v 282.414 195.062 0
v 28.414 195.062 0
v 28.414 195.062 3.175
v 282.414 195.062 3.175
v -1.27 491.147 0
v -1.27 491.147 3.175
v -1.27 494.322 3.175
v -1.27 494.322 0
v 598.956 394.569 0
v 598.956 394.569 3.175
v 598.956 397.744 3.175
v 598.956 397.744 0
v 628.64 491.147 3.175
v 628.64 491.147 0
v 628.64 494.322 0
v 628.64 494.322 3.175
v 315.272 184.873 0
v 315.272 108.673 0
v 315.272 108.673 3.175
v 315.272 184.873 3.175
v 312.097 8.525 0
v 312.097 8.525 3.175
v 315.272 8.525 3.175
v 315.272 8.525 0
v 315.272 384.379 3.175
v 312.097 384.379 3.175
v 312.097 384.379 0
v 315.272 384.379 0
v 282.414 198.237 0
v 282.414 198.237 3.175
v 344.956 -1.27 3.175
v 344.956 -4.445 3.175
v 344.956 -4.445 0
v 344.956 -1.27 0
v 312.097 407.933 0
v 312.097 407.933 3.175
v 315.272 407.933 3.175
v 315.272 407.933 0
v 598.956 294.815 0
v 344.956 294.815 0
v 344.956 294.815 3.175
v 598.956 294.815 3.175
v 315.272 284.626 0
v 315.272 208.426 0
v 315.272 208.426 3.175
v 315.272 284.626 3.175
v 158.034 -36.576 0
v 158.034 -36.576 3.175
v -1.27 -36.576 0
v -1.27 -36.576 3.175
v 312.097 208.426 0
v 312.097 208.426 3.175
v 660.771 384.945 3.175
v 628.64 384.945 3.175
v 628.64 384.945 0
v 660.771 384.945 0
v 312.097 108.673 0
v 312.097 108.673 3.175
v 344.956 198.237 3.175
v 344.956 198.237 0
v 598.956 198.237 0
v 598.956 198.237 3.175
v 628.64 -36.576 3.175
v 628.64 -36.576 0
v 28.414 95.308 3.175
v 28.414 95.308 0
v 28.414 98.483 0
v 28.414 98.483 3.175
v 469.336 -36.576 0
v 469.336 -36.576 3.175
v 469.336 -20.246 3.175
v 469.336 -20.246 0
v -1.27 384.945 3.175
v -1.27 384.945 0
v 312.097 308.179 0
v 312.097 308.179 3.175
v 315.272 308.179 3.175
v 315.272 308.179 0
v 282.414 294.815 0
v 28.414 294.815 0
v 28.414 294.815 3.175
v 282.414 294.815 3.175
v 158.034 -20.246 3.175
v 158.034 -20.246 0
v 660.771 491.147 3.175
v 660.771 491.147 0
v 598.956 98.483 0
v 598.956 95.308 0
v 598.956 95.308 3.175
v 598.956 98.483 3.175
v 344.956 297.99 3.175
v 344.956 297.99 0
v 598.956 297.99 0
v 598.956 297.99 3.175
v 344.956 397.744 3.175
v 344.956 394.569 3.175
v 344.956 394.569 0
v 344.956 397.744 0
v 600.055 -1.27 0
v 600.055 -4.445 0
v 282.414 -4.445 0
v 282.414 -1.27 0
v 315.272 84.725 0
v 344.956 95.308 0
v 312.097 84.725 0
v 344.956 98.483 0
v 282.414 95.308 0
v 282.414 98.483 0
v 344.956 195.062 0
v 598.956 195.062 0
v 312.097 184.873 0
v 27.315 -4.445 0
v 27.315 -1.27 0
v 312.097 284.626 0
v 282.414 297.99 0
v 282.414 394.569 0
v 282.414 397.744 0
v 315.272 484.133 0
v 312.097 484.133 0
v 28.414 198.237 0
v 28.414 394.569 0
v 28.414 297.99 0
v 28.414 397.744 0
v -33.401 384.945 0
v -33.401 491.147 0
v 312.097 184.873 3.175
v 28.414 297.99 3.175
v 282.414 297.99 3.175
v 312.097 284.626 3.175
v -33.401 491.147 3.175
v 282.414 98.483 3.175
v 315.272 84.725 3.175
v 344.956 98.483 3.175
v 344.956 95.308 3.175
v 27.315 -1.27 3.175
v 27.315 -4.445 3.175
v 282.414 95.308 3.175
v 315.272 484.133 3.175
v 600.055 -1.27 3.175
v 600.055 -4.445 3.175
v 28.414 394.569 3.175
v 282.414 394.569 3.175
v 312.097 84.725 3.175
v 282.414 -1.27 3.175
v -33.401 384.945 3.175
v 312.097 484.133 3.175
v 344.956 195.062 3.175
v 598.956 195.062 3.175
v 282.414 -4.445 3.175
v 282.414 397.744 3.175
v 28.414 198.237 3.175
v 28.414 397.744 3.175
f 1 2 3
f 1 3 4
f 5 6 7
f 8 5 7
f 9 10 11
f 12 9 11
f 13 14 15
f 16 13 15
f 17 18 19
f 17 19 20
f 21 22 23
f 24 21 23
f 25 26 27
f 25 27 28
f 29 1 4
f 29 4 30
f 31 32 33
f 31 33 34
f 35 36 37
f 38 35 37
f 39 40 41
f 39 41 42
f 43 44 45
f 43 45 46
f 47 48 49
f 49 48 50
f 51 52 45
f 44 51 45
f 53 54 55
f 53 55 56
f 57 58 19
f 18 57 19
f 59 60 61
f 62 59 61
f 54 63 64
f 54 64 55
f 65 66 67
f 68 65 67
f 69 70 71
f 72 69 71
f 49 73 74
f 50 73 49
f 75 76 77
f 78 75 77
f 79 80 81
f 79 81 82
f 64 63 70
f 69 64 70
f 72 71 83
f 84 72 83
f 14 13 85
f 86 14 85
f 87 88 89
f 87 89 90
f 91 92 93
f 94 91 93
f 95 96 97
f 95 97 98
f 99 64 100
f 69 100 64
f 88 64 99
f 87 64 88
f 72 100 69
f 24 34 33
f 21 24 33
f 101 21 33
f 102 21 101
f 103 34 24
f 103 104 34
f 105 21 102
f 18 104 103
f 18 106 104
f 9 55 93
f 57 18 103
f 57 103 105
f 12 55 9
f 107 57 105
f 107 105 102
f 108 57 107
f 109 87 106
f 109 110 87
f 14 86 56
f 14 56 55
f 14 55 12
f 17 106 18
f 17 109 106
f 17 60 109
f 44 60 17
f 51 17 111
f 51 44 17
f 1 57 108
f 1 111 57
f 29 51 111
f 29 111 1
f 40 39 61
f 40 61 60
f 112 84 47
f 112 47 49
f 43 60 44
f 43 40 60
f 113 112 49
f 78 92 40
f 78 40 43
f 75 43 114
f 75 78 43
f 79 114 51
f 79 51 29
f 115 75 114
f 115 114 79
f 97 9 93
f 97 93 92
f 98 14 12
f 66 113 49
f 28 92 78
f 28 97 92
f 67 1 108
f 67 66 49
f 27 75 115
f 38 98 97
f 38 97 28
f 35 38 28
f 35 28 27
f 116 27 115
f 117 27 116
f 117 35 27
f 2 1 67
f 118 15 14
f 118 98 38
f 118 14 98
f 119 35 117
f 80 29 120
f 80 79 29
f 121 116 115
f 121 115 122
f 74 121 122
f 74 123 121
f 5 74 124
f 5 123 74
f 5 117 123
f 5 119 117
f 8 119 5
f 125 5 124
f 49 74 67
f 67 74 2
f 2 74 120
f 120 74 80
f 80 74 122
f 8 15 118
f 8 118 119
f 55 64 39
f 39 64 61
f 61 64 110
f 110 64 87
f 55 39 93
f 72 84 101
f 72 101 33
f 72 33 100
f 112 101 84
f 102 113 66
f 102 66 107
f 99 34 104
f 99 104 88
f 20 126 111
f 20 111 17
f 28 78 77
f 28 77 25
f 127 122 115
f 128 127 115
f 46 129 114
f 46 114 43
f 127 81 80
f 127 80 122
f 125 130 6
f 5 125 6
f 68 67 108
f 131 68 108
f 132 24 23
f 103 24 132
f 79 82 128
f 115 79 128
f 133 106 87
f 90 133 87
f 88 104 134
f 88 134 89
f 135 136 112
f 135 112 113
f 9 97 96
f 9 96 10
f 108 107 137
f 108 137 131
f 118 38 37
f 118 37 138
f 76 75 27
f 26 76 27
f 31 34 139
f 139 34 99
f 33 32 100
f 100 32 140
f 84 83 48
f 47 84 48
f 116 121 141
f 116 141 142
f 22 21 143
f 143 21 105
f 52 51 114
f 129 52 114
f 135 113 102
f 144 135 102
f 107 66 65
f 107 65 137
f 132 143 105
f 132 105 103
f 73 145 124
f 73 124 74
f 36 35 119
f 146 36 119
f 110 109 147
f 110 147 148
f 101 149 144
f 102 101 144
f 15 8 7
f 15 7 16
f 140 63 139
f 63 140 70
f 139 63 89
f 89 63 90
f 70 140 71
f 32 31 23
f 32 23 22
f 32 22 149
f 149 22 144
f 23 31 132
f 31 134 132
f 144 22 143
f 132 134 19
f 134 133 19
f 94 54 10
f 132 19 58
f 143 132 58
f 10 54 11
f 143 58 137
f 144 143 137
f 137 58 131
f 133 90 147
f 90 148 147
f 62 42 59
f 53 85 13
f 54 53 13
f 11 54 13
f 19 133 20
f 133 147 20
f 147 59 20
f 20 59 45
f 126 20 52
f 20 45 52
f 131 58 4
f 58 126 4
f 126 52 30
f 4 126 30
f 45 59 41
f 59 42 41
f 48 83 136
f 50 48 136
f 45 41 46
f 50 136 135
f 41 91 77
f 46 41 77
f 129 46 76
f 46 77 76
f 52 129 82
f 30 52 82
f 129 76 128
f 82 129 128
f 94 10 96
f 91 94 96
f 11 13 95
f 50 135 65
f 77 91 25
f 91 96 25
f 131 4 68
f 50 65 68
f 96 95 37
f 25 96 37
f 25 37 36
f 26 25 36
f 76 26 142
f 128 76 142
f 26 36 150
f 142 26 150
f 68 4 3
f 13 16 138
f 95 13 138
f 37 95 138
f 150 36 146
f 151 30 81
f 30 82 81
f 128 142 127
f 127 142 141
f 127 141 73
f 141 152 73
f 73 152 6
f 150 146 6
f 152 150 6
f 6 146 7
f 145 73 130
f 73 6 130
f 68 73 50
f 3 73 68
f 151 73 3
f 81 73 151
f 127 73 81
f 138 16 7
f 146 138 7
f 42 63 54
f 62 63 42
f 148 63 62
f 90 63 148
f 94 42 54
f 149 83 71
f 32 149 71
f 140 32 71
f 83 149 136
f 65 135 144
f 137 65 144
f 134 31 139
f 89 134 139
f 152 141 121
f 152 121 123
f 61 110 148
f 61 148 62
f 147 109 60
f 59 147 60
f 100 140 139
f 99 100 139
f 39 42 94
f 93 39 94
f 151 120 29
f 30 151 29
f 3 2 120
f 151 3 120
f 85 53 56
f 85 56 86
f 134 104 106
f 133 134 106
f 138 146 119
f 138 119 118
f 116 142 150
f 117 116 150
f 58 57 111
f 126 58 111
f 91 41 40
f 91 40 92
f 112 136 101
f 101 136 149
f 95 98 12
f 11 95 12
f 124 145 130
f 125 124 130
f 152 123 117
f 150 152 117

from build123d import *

# Parameters (mm, degrees)
SKETCH2_W           = 629.90984
SKETCH2_H           = 495.5921
SKETCH2_W_2         = 254
SKETCH2_H_2         = 3.175
SKETCH2_W_3         = 3.175
SKETCH2_H_3         = 76.2
BOSS_EXTRUDE1_DEPTH = 3.175
SKETCH4_W           = 28.585012188
SKETCH4_H           = 3.175
SKETCH4_W_2         = 62.54242
BOSS_EXTRUDE2_DEPTH = 3.175
SKETCH5_W           = 32.131
SKETCH5_H           = 106.20248
BOSS_EXTRUDE3_DEPTH = 3.175


with BuildPart() as part:
    # Sketch2 → Boss-Extrude1 (new body)
    with BuildSketch(Plane.XY):
        with Locations((313.68492, 246.52605)):
            Rectangle(SKETCH2_W, SKETCH2_H)
        with Locations((155.41371, 96.89592)):
            Rectangle(SKETCH2_W_2, SKETCH2_H_2, mode=Mode.SUBTRACT)
        with Locations((155.41371, 196.64934)):
            Rectangle(SKETCH2_W_2, SKETCH2_H_2, mode=Mode.SUBTRACT)
        with Locations((155.41371, 296.40276)):
            Rectangle(SKETCH2_W_2, SKETCH2_H_2, mode=Mode.SUBTRACT)
        with Locations((155.41371, 396.15618)):
            Rectangle(SKETCH2_W_2, SKETCH2_H_2, mode=Mode.SUBTRACT)
        with Locations((471.95613, 96.89592)):
            Rectangle(SKETCH2_W_2, SKETCH2_H_2, mode=Mode.SUBTRACT)
        with Locations((471.95613, 196.64934)):
            Rectangle(SKETCH2_W_2, SKETCH2_H_2, mode=Mode.SUBTRACT)
        with Locations((471.95613, 396.15618)):
            Rectangle(SKETCH2_W_2, SKETCH2_H_2, mode=Mode.SUBTRACT)
        with Locations((471.95613, 296.40276)):
            Rectangle(SKETCH2_W_2, SKETCH2_H_2, mode=Mode.SUBTRACT)
        with Locations((313.68492, 46.625498166)):
            Rectangle(SKETCH2_W_3, SKETCH2_H_3, mode=Mode.SUBTRACT)
        with Locations((313.68492, 146.77263)):
            Rectangle(SKETCH2_W_3, SKETCH2_H_3, mode=Mode.SUBTRACT)
        with Locations((313.68492, 246.52605)):
            Rectangle(SKETCH2_W_3, SKETCH2_H_3, mode=Mode.SUBTRACT)
        with Locations((313.68492, 346.27947)):
            Rectangle(SKETCH2_W_3, SKETCH2_H_3, mode=Mode.SUBTRACT)
        with Locations((313.68492, 446.03289)):
            Rectangle(SKETCH2_W_3, SKETCH2_H_3, mode=Mode.SUBTRACT)
    extrude(amount=BOSS_EXTRUDE1_DEPTH)

    # Sketch4 → Boss-Extrude2 (add, through all)
    with BuildSketch(Plane.XY.offset(3.175)):
        with Locations((13.022506094, -2.8575)):
            Rectangle(SKETCH4_W, SKETCH4_H)
        with Locations((614.347333906, -2.8575)):
            Rectangle(SKETCH4_W, SKETCH4_H)
        with Locations((313.68492, -2.8575)):
            Rectangle(SKETCH4_W_2, SKETCH4_H)
    extrude(amount=-BOSS_EXTRUDE2_DEPTH)

    # Sketch5 → Boss-Extrude3 (add, through all)
    with BuildSketch(Plane.XY.offset(3.175)):
        Polygon((158.03372, -20.246485543), (158.03372, -36.576), (-1.27, -36.576), (-1.27, -7.62), (-1.27, -4.445), (628.63984, -4.445), (628.63984, -7.62), (628.63984, -36.576), (469.33612, -36.576), (469.33612, -20.246485543), align=None)
        with Locations((644.70534, 438.04586)):
            Rectangle(SKETCH5_W, SKETCH5_H)
        with Locations((-17.3355, 438.04586)):
            Rectangle(SKETCH5_W, SKETCH5_H)
    extrude(amount=-BOSS_EXTRUDE3_DEPTH)


solid = part.part
